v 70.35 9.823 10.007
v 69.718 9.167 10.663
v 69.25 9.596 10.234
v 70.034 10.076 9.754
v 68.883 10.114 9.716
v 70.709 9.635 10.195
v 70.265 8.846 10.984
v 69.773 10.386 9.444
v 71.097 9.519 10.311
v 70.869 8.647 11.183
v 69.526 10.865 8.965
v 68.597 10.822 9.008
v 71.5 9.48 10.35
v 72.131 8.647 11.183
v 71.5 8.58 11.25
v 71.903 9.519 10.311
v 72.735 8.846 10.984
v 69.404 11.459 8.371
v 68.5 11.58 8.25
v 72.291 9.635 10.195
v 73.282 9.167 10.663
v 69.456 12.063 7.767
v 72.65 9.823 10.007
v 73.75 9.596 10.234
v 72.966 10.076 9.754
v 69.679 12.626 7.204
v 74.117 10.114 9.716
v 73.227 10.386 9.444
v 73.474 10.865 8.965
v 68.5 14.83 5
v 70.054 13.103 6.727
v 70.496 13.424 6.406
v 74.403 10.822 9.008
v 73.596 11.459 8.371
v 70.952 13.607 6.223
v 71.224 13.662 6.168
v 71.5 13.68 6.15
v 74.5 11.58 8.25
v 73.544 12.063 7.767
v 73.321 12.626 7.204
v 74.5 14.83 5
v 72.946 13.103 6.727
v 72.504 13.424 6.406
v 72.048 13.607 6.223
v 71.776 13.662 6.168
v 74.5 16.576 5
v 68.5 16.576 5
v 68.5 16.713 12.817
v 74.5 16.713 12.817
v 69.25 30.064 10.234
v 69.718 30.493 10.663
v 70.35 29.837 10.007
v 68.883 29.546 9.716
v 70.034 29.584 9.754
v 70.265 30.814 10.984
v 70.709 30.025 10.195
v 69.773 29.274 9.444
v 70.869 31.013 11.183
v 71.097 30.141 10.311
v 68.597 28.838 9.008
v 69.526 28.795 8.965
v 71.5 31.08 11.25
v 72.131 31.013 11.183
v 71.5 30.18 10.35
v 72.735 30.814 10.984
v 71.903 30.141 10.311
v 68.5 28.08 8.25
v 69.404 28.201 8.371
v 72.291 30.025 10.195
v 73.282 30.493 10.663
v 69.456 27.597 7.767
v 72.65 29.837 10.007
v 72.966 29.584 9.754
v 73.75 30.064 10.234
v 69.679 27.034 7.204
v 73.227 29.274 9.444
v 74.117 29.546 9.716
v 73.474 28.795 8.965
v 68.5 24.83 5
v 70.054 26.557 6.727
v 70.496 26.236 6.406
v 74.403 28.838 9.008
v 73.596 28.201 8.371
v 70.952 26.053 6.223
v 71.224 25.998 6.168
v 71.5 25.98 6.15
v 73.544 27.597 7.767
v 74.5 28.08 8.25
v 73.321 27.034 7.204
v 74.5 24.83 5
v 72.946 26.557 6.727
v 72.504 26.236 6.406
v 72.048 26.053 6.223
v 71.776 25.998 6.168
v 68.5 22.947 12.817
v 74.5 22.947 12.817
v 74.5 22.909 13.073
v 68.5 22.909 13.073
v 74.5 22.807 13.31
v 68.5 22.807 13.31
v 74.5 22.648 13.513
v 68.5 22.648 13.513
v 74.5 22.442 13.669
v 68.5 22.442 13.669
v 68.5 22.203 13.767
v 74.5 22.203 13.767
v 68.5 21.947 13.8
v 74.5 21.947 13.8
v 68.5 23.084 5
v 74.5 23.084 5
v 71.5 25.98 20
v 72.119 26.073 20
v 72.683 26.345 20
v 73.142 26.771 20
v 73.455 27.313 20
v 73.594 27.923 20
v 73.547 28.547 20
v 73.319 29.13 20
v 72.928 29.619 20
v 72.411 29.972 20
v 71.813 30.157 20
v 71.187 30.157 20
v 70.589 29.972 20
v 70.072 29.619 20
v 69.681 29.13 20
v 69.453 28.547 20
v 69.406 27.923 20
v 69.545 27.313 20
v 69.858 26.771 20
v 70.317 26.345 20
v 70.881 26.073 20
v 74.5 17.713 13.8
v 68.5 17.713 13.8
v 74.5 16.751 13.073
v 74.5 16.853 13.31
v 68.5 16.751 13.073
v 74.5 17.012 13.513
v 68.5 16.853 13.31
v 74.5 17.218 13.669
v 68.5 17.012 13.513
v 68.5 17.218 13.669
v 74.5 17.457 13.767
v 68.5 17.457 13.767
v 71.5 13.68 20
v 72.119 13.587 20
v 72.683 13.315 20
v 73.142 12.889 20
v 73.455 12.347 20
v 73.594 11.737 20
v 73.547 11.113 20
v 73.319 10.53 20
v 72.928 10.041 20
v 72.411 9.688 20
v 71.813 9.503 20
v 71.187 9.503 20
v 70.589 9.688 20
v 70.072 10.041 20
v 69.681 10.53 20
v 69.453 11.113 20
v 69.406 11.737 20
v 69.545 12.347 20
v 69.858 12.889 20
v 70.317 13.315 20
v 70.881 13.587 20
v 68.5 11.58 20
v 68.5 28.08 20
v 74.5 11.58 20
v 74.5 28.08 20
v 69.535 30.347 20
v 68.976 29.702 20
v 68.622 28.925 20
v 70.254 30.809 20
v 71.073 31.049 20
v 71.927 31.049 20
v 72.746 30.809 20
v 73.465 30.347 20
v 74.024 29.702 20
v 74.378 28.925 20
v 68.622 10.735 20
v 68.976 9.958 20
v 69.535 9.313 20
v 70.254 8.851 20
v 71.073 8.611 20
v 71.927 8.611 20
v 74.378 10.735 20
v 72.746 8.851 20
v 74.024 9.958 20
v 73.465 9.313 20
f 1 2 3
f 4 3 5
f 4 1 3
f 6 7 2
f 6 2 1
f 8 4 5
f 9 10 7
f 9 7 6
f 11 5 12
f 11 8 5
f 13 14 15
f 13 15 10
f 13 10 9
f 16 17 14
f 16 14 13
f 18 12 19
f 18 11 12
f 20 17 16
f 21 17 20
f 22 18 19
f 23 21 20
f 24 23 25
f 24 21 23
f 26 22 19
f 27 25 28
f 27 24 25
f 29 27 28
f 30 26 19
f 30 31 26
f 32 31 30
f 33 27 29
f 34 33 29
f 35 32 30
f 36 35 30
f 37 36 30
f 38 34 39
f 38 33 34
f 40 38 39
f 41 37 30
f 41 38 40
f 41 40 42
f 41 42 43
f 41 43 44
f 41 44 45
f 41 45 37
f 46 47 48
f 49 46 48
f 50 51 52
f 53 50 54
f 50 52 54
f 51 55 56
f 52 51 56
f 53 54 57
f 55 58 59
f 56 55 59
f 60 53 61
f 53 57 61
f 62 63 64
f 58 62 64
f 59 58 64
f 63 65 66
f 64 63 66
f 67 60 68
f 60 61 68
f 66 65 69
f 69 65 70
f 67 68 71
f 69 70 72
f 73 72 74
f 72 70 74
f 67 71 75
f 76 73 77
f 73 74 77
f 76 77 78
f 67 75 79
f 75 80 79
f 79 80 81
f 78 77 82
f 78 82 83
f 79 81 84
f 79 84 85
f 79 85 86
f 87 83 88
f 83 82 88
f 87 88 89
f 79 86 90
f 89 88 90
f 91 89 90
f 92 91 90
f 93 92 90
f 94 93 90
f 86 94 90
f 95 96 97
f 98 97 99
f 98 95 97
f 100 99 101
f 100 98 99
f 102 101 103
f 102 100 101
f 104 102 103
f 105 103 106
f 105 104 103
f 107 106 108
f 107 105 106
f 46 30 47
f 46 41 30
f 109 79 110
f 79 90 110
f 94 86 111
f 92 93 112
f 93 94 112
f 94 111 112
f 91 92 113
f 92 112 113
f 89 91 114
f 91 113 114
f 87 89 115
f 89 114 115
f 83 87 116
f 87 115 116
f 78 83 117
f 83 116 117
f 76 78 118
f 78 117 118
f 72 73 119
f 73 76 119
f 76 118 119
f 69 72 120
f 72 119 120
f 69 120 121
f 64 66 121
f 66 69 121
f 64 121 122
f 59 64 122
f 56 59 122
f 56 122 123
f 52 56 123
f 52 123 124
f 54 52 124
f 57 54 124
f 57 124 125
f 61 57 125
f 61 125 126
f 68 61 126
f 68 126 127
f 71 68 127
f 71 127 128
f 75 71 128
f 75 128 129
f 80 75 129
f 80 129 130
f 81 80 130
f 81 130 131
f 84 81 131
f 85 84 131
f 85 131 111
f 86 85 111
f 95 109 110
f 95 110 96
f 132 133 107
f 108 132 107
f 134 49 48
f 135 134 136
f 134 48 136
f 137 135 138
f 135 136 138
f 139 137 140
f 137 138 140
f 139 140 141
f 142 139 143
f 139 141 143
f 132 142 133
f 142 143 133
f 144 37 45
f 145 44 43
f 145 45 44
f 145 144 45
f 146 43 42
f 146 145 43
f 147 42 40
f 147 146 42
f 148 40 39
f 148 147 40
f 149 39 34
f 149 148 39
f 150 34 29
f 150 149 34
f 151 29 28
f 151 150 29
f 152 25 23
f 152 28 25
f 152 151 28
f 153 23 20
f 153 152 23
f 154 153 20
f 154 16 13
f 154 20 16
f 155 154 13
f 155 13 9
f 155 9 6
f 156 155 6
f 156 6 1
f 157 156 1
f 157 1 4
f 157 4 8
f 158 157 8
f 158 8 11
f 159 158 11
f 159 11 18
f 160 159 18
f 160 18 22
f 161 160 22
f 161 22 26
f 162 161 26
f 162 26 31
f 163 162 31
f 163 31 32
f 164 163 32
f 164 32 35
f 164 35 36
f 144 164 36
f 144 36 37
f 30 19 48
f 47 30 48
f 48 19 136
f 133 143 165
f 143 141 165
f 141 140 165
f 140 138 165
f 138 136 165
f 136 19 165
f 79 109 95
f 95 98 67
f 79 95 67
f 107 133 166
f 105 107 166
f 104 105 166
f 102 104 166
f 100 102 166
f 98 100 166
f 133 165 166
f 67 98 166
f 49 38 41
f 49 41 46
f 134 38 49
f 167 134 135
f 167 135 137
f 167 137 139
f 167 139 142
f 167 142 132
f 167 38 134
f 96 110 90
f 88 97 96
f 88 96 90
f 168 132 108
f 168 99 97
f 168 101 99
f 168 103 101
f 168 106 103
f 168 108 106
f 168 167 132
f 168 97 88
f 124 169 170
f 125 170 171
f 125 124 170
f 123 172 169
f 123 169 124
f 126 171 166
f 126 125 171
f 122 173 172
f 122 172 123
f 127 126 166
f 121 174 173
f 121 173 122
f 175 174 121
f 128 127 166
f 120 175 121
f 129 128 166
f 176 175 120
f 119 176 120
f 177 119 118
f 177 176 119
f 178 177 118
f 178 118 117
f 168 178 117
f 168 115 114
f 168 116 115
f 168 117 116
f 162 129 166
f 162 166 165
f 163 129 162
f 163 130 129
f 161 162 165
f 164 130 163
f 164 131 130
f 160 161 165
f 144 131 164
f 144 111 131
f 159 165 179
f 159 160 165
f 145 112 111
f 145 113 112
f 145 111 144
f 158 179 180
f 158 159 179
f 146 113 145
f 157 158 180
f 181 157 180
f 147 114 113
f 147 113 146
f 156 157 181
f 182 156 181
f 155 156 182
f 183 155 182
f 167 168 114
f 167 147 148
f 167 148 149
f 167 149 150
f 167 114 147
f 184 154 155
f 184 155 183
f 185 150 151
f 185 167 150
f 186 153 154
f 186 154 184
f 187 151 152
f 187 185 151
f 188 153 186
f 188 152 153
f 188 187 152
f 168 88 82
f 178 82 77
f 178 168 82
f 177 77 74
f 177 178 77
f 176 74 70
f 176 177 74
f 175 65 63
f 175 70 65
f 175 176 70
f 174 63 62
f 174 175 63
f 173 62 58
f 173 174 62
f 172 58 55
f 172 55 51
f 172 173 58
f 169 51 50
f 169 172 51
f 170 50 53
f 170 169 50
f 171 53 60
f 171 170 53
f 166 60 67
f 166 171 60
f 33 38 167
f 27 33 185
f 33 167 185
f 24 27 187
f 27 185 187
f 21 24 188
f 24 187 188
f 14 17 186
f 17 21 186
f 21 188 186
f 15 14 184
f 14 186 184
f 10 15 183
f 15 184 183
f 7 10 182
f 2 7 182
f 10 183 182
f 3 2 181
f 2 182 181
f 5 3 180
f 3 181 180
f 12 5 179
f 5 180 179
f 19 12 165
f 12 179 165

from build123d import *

# Parameters (mm, degrees)
SKETCH215_R             = 2.1
PAD110_DEPTH            = 15
POCKET079_DEPTH         = 42.3742142452
POCKET079_DEPTH_BACK    = 42.3742142452
POCKET115_DEPTH         = 3.001
POCKET115_DEPTH_BACK    = 3.001
BODY091_ROLL_ANGLE      = -180
BODY091_PLACEMENT_ANGLE = 90


with BuildPart() as part:
    # Sketch215 → Pad110 (new body)
    with BuildSketch(Plane.XY):
        with BuildLine():
            ThreePointArc((-8.25, 3), (-11.25, 0), (-8.25, -3))
            Line((0, -3), (-8.25, -3))
            Line((0, 3), (0, -3))
            Line((0, 3), (-8.25, 3))
        make_face()
        with Locations((-8.25, 0)):
            Circle(SKETCH215_R, mode=Mode.SUBTRACT)
    extrude(amount=PAD110_DEPTH)

    # Sketch216 → Pocket079 (cut, two sides)
    with BuildSketch(Plane.XZ) as pocket079_sk:
        with BuildLine():
            Line((-3.2536045714, 15), (-3.117150432, 7.1825475936))
            ThreePointArc((-3.117150432, 7.1825475936), (-2.8182120012, 6.4867495508), (-2.1173027369, 6.2))
            Line((0, 6.2), (-2.1173027369, 6.2))
            Line((0, 6.2), (0, 15))
            Line((-3.2536045714, 15), (0, 15))
        make_face()
    extrude(amount=-POCKET079_DEPTH, mode=Mode.SUBTRACT)
    extrude(pocket079_sk.sketch, amount=POCKET079_DEPTH_BACK, mode=Mode.SUBTRACT)

    # Sketch268 → Pocket115 (cut, two sides)
    with BuildSketch(Plane.XZ) as pocket115_sk:
        Polygon((-12, 8), (-5, 15), (-12, 15), align=None)
    extrude(amount=-POCKET115_DEPTH, mode=Mode.SUBTRACT)
    extrude(pocket115_sk.sketch, amount=POCKET115_DEPTH_BACK, mode=Mode.SUBTRACT)

    # Mirrored046: part across Sketch216 V_Axis


with BuildPart() as part_1:
    add(part.part)
    add(part.part.mirror(Plane(origin=(0, 0, 0), x_dir=(0, -1, 0), z_dir=(1, 0, 0))))


with BuildPart() as part_2:
    # Body091 roll: moved
    add(part_1.part.rotate(Axis((0, 0, 0), (1, 0, 0)), BODY091_ROLL_ANGLE))


with BuildPart() as part_3:
    # Body091 placement: moved
    add(part_2.part.moved(Location((71.5, 19.83, 20))).rotate(Axis((71.5, 19.83, 20), (0, 0, 1)), BODY091_PLACEMENT_ANGLE))


solid = part_3.part
